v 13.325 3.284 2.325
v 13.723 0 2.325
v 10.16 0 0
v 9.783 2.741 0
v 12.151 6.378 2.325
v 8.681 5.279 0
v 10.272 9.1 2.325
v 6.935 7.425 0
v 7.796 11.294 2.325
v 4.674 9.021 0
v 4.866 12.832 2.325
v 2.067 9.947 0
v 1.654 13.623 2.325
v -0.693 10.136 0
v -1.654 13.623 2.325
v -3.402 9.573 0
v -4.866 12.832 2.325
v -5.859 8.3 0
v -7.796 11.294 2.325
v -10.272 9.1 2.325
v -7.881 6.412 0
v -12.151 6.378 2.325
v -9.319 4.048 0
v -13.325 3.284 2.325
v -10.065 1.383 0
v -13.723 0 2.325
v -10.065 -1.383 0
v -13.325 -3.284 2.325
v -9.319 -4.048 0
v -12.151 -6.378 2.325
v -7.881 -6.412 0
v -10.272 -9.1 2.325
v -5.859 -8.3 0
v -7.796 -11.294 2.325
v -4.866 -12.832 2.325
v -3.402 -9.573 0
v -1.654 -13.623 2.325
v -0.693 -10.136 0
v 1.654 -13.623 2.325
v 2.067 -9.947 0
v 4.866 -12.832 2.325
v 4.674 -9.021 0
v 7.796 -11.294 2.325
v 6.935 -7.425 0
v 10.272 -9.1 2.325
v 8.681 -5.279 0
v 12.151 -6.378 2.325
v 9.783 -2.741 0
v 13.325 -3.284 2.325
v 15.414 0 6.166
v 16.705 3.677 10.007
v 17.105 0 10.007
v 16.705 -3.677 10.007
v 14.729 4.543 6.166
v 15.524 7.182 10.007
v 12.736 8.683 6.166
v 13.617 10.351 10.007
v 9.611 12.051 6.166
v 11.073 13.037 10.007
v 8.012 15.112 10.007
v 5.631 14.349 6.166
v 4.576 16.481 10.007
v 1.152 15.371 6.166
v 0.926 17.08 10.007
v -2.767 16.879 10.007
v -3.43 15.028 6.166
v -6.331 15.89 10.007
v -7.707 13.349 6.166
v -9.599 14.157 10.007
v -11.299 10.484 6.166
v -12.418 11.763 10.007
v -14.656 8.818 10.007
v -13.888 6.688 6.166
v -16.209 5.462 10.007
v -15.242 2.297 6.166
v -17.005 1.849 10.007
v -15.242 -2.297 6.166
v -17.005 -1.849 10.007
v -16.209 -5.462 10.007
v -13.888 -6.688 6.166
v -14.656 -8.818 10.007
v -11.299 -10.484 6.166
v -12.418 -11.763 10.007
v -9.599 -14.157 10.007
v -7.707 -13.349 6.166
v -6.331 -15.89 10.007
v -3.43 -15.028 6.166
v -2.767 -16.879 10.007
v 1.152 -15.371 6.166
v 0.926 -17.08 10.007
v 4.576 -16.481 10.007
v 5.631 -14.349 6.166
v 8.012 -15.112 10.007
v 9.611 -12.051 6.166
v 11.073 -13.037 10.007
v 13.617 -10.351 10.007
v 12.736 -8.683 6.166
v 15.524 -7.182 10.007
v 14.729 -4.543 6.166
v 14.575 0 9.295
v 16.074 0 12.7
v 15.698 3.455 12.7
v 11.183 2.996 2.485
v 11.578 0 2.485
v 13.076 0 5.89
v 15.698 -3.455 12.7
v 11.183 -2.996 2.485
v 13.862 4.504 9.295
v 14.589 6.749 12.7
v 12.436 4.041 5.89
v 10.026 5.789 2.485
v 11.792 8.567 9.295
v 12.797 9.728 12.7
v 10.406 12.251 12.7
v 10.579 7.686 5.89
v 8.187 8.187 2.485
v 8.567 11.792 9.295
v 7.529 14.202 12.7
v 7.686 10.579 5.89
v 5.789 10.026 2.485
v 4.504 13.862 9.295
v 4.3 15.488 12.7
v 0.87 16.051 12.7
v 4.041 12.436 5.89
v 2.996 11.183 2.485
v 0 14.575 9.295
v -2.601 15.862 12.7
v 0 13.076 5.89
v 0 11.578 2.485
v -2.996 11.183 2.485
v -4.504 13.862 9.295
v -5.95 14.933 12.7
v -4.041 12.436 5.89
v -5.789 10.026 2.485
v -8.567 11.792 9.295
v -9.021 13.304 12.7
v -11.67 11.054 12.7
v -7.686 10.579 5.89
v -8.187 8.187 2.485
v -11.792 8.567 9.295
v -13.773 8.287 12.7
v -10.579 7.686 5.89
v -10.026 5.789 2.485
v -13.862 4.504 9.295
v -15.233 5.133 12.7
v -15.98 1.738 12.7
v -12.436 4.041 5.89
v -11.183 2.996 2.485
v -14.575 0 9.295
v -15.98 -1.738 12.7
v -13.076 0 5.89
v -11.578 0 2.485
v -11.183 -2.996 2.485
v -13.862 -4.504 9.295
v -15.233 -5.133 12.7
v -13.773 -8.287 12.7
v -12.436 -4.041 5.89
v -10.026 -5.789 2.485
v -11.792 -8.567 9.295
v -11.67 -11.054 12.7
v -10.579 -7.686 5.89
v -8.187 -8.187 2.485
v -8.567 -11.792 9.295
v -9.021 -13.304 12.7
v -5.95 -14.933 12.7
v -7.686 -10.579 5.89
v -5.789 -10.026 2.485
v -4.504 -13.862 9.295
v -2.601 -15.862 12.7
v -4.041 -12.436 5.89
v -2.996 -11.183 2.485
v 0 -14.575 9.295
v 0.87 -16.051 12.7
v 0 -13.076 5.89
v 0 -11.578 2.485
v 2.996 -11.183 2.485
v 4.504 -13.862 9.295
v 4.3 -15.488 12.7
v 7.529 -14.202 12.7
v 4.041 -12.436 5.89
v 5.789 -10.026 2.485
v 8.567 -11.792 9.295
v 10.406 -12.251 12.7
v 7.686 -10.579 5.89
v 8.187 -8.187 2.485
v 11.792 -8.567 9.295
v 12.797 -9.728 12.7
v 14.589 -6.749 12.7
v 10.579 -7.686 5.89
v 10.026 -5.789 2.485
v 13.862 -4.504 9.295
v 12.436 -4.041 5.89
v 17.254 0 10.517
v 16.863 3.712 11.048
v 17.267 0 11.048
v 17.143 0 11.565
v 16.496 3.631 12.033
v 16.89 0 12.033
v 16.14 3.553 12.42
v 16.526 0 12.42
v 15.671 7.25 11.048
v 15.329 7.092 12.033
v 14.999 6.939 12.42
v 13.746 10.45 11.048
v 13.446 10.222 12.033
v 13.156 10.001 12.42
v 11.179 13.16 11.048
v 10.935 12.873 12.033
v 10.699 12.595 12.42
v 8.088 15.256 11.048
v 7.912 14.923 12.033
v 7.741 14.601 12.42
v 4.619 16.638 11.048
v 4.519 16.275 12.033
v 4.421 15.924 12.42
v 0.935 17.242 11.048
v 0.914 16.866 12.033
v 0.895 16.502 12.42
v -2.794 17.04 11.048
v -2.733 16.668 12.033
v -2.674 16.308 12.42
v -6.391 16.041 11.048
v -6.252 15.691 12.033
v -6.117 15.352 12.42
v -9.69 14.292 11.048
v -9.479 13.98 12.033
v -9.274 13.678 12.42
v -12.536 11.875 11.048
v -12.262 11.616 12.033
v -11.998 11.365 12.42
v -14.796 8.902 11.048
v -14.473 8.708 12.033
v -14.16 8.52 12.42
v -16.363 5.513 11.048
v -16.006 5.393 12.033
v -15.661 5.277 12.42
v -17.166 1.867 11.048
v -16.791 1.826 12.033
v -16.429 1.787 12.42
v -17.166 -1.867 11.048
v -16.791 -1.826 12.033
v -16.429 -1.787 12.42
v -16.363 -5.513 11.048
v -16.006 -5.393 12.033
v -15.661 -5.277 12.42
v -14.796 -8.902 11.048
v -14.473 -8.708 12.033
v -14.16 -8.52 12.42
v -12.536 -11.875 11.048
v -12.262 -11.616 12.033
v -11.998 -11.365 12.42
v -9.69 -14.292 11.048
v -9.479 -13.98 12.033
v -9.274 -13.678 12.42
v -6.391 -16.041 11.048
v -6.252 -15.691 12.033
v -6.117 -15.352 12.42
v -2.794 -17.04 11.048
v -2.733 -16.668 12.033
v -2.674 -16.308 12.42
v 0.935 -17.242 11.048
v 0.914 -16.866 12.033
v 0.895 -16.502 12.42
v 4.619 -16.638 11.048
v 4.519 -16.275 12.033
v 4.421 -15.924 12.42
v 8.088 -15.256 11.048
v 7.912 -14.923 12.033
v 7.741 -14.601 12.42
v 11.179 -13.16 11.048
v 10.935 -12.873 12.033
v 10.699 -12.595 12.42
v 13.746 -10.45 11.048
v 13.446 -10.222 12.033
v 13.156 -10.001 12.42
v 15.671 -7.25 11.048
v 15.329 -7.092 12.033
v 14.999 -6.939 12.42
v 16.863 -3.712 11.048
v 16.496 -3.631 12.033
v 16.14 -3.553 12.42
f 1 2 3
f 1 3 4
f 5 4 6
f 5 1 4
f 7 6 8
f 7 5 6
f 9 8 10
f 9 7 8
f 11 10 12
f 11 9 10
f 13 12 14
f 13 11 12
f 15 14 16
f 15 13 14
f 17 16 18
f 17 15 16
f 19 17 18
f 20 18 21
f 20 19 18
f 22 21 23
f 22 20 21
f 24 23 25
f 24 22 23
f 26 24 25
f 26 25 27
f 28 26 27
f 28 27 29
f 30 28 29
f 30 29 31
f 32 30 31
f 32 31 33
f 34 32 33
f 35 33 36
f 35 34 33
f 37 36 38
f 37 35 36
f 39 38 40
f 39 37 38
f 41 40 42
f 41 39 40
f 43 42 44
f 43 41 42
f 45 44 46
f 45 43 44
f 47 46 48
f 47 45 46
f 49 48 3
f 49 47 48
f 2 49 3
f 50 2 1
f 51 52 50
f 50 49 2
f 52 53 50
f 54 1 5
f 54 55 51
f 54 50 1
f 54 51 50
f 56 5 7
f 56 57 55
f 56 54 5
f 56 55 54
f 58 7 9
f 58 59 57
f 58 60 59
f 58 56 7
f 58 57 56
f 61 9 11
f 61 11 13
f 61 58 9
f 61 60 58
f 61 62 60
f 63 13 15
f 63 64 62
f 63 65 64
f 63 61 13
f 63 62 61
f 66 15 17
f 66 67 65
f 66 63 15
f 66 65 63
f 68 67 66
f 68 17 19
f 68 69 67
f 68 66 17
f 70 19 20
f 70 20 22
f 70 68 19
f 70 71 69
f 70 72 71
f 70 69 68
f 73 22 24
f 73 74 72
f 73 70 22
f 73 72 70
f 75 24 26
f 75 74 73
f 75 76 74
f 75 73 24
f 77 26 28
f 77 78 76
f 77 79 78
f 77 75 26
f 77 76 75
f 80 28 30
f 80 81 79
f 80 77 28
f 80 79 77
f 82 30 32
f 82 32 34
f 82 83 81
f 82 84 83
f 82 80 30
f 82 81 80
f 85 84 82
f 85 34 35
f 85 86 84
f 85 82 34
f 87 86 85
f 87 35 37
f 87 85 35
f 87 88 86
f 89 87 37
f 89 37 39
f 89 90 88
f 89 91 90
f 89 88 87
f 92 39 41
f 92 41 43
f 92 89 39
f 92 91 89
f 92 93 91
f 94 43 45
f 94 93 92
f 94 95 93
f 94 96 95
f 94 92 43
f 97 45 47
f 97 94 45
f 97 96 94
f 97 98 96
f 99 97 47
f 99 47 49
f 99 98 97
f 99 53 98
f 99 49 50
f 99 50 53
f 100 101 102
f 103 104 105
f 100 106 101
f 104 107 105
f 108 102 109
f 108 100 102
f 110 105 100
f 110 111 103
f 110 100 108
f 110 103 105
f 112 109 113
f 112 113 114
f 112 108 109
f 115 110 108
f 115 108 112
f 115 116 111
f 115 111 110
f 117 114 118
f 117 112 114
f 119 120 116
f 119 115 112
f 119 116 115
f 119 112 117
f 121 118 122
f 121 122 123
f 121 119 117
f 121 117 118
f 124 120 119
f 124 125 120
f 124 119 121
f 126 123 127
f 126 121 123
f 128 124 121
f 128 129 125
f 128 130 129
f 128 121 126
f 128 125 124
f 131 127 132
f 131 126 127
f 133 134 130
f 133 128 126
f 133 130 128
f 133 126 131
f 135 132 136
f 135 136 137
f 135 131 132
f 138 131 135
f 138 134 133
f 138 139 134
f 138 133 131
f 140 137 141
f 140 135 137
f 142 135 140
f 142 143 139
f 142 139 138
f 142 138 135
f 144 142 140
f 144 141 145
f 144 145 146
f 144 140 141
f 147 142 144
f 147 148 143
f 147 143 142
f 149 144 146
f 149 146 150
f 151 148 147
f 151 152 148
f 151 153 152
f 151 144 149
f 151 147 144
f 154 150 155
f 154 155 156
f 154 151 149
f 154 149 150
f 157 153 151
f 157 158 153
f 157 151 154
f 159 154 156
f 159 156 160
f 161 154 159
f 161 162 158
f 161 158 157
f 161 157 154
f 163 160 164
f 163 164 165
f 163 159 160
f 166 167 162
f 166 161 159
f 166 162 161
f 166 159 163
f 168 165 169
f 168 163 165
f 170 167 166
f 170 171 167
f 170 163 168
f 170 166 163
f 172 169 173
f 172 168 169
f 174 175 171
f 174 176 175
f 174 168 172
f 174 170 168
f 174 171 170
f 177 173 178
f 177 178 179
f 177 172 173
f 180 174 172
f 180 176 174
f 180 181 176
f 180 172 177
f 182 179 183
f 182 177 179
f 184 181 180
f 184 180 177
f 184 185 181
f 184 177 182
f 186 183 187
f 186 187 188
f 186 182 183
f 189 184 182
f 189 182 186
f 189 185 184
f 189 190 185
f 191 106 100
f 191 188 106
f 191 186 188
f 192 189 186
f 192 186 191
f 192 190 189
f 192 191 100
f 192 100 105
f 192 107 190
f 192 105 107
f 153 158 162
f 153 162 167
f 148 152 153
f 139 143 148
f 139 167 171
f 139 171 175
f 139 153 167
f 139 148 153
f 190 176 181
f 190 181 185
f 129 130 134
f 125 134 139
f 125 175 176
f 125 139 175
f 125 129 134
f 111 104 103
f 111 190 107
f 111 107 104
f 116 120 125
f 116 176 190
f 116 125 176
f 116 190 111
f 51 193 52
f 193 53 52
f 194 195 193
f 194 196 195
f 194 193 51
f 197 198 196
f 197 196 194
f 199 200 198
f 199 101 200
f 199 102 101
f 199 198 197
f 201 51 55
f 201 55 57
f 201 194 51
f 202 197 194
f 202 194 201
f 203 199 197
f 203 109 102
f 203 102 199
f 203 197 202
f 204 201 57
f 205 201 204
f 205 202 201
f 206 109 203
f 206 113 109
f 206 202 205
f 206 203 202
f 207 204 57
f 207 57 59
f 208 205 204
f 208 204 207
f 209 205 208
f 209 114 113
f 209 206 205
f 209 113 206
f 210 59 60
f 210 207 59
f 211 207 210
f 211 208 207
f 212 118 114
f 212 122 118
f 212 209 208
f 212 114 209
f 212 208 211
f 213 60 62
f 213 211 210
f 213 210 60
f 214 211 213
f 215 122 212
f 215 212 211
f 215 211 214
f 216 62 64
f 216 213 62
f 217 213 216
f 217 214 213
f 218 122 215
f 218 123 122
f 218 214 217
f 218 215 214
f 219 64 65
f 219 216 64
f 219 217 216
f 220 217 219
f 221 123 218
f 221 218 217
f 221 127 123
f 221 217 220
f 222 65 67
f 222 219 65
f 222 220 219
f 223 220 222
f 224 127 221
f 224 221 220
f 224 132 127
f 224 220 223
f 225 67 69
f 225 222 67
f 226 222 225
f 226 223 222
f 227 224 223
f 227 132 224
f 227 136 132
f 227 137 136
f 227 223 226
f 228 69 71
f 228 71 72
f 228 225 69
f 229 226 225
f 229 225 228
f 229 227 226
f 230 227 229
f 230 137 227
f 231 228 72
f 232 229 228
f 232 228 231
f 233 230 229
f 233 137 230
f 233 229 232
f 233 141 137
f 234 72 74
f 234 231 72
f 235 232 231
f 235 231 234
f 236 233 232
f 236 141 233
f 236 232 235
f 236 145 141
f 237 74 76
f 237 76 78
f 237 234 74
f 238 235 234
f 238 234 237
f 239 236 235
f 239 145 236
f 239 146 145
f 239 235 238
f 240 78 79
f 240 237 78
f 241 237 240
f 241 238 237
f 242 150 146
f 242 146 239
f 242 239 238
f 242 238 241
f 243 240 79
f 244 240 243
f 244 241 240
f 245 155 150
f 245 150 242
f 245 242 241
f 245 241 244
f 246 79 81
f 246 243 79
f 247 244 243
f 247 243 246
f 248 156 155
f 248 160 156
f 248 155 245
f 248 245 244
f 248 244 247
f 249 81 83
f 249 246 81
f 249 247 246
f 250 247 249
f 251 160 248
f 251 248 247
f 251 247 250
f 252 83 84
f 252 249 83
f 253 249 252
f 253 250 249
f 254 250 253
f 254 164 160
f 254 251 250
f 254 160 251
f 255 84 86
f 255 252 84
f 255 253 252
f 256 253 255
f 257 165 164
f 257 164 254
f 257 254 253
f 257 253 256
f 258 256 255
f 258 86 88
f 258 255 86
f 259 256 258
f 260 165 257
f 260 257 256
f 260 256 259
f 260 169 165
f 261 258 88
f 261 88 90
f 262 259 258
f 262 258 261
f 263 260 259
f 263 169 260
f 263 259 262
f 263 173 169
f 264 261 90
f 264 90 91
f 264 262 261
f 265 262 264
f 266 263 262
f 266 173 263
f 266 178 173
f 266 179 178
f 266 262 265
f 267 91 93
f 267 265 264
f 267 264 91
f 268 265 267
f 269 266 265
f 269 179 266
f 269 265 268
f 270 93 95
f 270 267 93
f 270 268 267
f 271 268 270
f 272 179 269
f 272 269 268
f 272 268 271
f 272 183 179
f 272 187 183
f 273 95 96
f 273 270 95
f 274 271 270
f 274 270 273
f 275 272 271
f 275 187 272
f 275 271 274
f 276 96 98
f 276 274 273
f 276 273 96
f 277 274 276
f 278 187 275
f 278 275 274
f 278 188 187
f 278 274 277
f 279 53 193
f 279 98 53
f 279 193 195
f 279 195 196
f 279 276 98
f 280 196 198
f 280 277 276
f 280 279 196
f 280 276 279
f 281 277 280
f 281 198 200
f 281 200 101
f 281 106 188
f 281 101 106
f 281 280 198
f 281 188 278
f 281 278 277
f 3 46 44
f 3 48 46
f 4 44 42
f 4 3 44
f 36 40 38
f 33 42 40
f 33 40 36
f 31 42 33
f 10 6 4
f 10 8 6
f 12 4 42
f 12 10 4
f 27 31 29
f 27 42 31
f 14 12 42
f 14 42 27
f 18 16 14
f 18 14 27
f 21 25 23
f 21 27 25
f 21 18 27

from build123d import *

# Parameters (mm, degrees)
F3_SIZE = 2.54


# Not quite as in the source:
# - a fillet or chamfer that OpenCascade refuses, or shapes differently, is made with other operations: its cross-section is extruded or revolved along the edge and cut away or added


with BuildPart() as f1:
    # F0 (on Front) → F1 (revolve)
    with BuildSketch(Plane.XZ):
        Polygon((0, 2.484759083), (0, 0), (12.7, 0), (18.2904321501, 12.7), (16.0741669896, 12.7), (11.577504687, 2.484759083), align=None)
    revolve(axis=Axis((0, 0, 10.5566112325), (0, 0, 1)))

    # F2: fillet of radius 2.0499963011 on 1 edges, made by hand

    # F2_s1 → F2_t2 (revolve, cut)
    with BuildSketch(Plane.XZ):
        with BuildLine():
            ThreePointArc((17.1048272979, 10.0066158002), (17.1431716206, 11.5651790127), (16.0741669896, 12.7))
            Line((16.0741669896, 12.7), (18.2904321501, 12.7))
            Line((18.2904321501, 12.7), (17.1048272979, 10.0066158002))
        make_face()
    revolve(axis=Axis((0, 0, 12.7), (0, 0, 1)), mode=Mode.SUBTRACT)

    # F3
    f3_edges = [f1.edges().sort_by_distance(p)[0] for p in [
        (-12.7, 0, 0),
    ]]
    chamfer(f3_edges, length=F3_SIZE)


solid = f1.part
